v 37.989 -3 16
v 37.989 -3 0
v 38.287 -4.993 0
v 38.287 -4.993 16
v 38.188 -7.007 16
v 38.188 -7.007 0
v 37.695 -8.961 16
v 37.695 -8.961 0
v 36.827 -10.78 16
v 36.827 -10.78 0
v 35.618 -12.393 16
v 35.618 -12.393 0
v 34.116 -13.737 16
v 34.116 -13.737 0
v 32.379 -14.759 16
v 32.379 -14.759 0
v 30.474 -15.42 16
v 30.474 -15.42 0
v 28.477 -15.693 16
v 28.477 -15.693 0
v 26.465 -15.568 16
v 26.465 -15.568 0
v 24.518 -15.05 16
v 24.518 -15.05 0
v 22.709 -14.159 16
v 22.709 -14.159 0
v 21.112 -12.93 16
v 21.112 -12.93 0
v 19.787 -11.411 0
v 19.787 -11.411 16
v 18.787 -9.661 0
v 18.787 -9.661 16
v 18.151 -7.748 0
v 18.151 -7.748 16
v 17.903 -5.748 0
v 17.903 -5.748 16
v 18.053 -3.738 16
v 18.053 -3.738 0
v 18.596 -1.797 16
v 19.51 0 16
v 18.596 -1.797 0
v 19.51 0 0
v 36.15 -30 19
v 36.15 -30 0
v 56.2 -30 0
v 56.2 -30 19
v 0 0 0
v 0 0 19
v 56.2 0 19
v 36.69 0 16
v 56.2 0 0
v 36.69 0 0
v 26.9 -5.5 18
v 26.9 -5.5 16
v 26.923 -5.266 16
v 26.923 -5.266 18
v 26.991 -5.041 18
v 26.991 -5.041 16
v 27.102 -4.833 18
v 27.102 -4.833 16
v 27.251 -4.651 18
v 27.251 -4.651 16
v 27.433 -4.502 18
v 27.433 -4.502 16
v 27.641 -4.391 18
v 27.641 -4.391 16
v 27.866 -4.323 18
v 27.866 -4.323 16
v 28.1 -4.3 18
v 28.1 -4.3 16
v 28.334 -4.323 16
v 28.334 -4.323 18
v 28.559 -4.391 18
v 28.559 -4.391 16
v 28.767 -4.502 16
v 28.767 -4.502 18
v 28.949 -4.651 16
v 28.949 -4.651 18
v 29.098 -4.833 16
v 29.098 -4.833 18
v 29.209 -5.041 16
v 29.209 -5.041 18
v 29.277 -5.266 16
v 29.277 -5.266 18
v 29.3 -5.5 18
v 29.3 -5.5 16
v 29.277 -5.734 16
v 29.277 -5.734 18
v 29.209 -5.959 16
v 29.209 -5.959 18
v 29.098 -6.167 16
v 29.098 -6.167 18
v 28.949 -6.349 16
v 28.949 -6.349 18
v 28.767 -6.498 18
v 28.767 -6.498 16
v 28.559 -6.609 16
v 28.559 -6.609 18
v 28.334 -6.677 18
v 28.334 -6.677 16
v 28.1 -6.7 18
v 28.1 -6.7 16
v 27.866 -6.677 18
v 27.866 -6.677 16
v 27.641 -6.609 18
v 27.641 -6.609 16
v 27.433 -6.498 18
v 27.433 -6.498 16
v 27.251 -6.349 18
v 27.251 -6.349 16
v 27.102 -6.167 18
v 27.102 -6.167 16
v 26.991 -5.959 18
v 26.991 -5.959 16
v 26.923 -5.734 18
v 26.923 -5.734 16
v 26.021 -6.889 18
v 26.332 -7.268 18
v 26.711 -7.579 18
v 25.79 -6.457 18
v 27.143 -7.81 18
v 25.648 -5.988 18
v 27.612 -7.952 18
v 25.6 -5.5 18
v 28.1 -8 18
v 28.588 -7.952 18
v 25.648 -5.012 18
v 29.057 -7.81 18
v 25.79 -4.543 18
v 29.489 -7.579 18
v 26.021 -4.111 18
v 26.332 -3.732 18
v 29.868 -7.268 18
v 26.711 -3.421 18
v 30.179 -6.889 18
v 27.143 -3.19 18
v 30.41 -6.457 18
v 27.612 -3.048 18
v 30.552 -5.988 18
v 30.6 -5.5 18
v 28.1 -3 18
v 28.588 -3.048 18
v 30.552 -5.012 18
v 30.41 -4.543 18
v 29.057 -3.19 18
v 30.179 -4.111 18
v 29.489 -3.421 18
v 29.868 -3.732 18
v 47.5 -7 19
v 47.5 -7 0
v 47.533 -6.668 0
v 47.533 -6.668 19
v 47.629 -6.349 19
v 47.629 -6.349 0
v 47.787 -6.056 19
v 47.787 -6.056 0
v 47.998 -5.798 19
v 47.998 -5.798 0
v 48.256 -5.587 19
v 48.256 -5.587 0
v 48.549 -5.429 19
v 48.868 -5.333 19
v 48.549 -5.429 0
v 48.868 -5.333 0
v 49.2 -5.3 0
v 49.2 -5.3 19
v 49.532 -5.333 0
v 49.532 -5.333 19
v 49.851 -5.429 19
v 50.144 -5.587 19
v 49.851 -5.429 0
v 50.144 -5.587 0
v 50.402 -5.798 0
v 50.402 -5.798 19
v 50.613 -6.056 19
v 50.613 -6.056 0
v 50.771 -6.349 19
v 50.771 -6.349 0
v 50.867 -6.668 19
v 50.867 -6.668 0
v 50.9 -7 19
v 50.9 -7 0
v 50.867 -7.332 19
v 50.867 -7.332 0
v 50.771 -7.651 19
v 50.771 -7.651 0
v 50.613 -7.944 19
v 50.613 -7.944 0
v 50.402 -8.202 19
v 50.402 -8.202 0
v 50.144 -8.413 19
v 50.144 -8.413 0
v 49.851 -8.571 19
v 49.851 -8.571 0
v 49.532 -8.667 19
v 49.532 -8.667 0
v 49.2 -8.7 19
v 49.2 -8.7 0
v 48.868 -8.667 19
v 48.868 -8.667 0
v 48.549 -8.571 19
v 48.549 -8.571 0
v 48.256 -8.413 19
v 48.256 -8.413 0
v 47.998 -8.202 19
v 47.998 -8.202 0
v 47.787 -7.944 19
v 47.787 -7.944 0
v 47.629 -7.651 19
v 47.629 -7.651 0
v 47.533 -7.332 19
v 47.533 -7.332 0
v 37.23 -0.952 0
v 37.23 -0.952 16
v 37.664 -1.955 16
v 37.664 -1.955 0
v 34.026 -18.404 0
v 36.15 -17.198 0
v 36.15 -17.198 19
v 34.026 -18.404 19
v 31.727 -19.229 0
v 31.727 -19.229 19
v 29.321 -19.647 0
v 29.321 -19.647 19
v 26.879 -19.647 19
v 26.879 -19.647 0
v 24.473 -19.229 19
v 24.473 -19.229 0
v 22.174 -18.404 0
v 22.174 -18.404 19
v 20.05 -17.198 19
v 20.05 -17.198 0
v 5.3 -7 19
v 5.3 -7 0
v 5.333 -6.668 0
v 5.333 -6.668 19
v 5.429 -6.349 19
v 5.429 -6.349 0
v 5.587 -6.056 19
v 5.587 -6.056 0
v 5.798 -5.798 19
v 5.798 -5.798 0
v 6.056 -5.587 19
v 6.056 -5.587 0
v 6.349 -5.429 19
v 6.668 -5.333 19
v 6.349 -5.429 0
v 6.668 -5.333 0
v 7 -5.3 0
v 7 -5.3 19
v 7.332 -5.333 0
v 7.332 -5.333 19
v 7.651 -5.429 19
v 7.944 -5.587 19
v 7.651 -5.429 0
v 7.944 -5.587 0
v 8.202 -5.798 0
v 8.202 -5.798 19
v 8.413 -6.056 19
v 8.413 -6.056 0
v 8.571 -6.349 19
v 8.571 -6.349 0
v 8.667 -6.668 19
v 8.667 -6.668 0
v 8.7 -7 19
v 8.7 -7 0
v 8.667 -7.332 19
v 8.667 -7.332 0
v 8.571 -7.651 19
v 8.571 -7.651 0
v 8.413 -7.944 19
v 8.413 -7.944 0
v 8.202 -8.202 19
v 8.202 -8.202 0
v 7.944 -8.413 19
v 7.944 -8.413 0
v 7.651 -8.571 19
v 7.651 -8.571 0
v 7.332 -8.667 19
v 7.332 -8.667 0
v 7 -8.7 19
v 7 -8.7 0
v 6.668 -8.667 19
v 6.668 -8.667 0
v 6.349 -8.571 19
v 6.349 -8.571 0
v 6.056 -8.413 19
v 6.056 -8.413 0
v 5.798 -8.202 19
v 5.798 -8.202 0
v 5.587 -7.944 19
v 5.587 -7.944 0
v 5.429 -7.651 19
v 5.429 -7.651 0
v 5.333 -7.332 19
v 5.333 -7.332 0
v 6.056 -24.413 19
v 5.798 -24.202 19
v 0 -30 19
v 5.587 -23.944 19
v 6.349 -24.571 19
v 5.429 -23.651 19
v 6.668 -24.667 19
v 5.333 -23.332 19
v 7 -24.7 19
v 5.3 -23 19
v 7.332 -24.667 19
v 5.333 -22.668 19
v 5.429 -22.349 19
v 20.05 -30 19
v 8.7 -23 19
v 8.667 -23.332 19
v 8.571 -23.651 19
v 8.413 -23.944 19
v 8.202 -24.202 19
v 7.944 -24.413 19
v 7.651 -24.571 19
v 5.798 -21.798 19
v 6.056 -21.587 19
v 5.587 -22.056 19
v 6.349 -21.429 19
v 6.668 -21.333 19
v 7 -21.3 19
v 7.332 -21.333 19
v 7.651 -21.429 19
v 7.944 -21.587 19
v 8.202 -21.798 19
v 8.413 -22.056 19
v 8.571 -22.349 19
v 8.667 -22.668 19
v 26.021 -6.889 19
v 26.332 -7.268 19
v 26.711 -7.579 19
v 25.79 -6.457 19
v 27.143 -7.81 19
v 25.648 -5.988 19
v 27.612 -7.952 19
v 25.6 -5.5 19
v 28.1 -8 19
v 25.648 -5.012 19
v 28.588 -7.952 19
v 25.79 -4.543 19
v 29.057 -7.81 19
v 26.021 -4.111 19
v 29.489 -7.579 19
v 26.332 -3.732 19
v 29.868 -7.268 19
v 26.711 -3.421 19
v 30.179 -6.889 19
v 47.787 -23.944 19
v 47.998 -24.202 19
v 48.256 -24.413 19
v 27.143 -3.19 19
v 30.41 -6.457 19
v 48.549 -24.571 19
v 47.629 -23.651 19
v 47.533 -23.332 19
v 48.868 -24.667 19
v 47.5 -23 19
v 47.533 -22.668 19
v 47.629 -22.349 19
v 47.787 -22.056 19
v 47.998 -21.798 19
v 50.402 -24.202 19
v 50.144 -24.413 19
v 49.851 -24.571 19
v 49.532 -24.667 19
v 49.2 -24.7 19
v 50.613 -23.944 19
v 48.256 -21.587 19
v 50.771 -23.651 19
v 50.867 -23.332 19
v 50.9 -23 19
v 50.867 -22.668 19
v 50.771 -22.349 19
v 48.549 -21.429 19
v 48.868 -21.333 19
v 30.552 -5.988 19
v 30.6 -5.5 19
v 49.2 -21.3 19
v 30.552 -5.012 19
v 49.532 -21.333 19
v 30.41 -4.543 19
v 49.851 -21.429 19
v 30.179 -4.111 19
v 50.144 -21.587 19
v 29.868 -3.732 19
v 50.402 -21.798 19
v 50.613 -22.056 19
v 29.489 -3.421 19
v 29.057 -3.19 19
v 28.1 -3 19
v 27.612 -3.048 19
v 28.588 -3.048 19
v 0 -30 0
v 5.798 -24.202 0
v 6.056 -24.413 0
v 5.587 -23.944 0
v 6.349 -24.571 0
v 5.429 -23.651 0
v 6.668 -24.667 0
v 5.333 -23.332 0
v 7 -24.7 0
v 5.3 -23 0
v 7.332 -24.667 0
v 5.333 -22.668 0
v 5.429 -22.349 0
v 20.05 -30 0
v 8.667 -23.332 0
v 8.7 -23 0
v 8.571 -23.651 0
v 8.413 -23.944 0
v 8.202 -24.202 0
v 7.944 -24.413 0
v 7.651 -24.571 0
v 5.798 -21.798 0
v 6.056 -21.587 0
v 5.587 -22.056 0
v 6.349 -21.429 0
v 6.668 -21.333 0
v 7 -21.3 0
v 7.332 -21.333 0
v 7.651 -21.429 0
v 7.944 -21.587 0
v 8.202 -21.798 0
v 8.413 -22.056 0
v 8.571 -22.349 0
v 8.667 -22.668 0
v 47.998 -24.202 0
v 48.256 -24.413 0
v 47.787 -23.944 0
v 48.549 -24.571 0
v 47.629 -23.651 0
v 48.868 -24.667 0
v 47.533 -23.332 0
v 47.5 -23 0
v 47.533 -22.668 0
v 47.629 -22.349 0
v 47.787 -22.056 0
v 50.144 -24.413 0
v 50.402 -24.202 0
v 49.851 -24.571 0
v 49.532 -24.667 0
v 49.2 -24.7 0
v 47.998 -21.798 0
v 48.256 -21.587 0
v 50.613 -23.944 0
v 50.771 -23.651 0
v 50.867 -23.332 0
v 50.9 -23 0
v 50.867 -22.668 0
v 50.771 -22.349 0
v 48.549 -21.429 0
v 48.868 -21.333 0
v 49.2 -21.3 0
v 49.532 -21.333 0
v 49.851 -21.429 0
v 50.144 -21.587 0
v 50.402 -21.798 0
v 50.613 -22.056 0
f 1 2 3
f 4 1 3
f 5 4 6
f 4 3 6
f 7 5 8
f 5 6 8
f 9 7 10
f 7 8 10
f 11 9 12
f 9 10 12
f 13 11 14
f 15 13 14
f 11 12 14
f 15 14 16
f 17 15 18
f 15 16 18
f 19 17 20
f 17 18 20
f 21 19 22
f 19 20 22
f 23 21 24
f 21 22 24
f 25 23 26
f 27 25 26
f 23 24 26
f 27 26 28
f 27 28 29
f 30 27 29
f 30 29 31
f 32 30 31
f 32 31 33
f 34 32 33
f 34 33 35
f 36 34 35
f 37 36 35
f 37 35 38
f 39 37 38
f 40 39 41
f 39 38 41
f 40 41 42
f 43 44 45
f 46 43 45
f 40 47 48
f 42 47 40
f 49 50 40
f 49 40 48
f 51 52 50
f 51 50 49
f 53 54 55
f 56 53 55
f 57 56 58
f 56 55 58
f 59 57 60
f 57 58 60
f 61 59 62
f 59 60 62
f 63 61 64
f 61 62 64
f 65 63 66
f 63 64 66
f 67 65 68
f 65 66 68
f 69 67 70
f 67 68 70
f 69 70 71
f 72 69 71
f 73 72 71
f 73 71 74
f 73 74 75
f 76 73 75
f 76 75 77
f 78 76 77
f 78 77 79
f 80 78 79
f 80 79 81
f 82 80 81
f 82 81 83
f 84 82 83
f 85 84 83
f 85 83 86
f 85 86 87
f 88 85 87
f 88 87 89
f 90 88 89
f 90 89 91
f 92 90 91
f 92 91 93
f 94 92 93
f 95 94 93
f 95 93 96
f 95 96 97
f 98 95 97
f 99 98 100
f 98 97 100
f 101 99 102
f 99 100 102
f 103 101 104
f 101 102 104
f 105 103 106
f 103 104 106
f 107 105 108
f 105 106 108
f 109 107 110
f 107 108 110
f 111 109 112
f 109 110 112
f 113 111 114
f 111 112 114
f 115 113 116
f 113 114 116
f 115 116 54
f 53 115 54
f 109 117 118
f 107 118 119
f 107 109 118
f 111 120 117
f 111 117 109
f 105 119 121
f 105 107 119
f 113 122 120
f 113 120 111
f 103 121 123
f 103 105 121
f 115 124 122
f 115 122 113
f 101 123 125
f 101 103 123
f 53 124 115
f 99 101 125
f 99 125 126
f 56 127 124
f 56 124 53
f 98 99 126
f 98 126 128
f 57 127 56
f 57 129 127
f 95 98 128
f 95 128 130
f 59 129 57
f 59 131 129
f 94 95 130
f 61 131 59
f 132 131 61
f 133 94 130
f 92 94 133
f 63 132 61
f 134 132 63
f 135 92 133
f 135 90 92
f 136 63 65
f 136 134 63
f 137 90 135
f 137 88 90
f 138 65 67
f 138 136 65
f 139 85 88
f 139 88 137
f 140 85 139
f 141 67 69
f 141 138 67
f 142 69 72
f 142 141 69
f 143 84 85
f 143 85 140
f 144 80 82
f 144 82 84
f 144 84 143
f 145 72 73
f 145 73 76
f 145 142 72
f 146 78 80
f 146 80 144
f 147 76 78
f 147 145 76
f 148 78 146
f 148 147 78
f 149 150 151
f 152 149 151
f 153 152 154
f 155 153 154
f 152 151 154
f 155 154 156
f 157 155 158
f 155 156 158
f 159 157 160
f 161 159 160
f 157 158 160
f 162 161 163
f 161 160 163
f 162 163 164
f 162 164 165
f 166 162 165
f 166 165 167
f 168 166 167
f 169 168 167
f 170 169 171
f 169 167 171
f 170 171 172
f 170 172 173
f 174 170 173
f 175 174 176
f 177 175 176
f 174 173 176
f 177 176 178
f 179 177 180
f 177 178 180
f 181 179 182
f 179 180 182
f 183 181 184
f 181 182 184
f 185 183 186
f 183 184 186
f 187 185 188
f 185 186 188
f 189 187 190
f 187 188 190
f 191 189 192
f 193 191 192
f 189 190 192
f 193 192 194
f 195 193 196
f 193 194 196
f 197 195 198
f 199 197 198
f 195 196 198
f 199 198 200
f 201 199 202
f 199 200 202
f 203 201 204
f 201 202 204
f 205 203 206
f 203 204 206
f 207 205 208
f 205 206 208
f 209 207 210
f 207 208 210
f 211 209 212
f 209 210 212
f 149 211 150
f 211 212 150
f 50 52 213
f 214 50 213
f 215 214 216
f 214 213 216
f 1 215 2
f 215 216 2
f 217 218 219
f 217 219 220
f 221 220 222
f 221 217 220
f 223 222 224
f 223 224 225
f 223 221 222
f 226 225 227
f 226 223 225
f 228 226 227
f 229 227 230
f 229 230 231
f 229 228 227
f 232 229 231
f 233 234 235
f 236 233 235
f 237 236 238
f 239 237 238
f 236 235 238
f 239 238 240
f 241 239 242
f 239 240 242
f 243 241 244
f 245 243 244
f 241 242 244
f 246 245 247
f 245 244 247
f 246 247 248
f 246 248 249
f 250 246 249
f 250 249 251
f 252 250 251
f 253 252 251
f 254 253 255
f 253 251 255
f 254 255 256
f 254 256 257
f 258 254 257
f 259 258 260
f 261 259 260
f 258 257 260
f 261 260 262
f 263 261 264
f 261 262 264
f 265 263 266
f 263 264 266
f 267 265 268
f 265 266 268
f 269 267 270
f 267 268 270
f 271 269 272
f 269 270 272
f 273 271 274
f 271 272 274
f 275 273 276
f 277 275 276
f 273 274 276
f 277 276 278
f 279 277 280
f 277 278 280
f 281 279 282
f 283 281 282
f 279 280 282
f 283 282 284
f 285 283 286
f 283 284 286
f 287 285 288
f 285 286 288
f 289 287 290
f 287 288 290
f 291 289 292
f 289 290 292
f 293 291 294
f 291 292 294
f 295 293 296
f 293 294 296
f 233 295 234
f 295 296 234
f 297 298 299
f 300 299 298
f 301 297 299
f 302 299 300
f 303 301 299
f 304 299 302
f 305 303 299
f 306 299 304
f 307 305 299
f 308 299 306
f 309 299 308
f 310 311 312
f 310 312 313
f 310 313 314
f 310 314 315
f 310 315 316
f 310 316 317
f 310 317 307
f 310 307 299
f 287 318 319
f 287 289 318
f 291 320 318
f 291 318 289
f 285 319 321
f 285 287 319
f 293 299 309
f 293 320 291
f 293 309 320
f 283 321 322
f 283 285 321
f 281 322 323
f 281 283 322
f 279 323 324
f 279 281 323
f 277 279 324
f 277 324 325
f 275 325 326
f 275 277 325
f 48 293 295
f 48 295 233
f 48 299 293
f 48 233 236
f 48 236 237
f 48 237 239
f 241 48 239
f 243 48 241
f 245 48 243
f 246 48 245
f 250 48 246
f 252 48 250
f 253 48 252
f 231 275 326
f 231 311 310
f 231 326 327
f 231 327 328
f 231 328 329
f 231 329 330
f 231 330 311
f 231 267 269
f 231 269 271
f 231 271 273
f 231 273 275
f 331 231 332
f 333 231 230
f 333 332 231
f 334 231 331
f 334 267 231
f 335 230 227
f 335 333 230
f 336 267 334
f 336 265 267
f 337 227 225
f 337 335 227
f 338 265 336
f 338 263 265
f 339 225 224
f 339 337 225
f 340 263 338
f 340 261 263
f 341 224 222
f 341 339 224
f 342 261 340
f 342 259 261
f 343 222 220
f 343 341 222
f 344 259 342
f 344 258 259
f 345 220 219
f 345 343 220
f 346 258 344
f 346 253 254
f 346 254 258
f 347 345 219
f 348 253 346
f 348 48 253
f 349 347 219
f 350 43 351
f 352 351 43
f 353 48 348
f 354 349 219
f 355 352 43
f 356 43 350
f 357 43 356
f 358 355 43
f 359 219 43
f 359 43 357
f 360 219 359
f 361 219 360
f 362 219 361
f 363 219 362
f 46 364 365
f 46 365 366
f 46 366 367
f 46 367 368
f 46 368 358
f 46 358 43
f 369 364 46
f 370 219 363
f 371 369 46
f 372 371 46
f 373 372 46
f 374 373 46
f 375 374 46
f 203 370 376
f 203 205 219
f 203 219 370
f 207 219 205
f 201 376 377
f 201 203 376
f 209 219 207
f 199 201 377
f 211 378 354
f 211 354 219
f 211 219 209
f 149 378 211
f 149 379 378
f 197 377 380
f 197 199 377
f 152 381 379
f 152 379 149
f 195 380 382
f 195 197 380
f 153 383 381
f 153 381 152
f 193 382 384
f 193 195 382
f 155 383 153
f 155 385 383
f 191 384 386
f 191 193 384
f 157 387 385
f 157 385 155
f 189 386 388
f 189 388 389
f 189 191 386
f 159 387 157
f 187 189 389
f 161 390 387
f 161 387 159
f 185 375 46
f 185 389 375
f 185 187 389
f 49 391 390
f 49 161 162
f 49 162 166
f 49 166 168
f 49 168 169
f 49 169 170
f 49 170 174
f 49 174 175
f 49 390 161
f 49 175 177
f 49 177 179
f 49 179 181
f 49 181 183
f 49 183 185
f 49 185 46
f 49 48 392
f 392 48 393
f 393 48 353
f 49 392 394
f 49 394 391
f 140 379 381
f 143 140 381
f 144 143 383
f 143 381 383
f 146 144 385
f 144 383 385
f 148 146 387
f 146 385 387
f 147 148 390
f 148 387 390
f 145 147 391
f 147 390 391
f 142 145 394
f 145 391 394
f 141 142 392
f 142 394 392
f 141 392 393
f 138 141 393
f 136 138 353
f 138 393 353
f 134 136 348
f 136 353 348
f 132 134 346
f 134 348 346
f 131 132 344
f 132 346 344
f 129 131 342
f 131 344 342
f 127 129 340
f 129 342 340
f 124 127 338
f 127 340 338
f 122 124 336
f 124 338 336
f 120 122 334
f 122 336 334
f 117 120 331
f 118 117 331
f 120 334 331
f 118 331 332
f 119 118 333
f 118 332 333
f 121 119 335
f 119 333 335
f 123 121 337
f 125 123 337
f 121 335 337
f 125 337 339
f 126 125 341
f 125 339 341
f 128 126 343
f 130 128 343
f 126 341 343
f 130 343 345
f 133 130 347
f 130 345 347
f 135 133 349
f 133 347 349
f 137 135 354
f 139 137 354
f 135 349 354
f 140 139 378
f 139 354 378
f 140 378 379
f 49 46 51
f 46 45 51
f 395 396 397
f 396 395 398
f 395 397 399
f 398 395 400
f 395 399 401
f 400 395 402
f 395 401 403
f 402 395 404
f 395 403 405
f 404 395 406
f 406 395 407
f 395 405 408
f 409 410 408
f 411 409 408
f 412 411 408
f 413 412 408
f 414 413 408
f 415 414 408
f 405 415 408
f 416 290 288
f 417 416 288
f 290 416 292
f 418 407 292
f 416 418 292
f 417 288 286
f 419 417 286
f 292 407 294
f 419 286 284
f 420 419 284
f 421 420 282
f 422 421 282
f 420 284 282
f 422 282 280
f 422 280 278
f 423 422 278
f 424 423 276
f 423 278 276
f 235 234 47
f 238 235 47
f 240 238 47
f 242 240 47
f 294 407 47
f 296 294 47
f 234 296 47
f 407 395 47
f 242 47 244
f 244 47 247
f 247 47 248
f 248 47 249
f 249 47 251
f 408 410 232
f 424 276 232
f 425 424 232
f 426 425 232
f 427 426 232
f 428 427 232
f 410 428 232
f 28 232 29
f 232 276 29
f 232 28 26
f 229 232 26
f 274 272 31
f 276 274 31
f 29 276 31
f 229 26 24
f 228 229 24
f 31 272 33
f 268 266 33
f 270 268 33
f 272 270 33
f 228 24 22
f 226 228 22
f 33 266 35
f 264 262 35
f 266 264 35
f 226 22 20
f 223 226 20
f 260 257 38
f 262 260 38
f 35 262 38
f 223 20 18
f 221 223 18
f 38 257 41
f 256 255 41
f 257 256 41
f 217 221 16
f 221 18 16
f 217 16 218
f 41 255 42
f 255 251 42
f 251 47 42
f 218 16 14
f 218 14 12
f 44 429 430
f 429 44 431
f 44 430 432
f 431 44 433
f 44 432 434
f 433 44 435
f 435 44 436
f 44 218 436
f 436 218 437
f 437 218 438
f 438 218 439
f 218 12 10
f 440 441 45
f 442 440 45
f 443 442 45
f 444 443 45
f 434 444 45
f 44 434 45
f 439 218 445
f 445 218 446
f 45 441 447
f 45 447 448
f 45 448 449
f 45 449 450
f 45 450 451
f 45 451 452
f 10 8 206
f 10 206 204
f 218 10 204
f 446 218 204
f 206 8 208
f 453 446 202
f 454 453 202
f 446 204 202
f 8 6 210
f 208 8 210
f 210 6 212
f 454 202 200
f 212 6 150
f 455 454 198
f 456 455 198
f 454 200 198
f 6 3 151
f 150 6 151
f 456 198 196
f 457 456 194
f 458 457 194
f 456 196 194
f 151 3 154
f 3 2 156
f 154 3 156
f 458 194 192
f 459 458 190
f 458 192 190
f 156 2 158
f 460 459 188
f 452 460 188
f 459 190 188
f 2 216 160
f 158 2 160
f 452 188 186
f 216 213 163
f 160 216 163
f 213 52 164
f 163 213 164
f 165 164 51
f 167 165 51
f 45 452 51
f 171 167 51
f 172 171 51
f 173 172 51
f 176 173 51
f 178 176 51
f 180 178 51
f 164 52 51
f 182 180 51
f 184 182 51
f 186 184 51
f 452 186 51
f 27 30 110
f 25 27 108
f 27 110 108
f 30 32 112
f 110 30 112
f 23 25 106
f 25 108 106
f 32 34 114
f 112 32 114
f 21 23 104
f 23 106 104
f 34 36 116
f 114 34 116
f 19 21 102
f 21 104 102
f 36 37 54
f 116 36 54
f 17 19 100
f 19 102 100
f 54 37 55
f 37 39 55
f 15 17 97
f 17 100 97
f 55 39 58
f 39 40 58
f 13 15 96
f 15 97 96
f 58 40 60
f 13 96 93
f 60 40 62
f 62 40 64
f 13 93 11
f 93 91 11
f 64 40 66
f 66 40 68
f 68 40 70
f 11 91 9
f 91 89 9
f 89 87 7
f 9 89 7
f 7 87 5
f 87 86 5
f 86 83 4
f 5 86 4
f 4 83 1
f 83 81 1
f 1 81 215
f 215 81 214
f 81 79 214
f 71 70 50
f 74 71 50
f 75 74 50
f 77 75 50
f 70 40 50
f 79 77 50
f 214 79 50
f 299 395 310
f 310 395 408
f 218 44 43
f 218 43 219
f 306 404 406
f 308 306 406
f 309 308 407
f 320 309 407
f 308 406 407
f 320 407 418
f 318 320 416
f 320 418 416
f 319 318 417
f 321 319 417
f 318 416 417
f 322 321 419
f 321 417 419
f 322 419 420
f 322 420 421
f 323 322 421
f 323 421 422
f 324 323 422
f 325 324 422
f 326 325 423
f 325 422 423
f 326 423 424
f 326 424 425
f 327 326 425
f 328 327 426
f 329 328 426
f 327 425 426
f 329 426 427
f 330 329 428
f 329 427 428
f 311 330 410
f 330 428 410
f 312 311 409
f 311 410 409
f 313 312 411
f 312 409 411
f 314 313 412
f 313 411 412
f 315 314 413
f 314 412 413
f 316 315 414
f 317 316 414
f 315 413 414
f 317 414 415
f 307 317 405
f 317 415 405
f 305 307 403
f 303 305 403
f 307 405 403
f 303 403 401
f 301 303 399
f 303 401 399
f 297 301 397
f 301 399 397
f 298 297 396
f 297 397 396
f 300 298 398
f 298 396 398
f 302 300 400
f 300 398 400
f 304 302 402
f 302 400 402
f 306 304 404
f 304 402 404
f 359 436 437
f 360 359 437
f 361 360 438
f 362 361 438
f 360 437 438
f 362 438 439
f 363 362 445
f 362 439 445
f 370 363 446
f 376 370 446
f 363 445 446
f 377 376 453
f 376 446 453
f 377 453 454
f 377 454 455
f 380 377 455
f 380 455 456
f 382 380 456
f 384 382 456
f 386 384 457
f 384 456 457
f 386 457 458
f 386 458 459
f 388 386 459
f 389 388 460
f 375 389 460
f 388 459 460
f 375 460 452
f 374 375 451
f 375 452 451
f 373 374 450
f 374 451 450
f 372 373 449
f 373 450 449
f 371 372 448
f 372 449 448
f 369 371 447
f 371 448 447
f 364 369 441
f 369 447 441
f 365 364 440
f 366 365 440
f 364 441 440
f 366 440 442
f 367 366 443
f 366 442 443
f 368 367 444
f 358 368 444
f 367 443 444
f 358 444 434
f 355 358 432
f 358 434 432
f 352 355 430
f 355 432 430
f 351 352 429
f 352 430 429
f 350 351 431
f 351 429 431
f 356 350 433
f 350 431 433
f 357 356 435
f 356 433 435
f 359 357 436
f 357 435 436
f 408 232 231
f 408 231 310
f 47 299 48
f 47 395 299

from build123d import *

# Parameters (mm, degrees)
BOSS_EXTRUDE1_DEPTH = 16
SKETCH3_W           = 56.2
SKETCH3_H           = 30
BOSS_EXTRUDE2_DEPTH = 3
SKETCH4_R           = 1.7
SKETCH4_R_2         = 1.2
CUT_EXTRUDE2_DEPTH  = 19
CUT_EXTRUDE3_DEPTH  = 16
CUT_EXTRUDE6_REACH  = 21
SKETCH10_R          = 2.5
CUT_EXTRUDE7_DEPTH  = 1


with BuildPart() as part:
    # Sketch1 → Boss-Extrude1 (new body)
    with BuildSketch(Plane.XY):
        with BuildLine():
            Line((19.509889407, 0), (0, 0))
            Line((0, 0), (0, -30))
            Line((0, -30), (56.2, -30))
            Line((56.2, -30), (56.2, 0))
            Line((56.2, 0), (36.690110593, 0))
            Line((36.690110593, 0), (35.825930365, 0))
            ThreePointArc((35.825930365, 0), (34.325930365, -1.5), (35.825930365, -3))
            Line((35.825930365, -3), (37.988882647, -3))
            ThreePointArc((37.988882647, -3), (26.465465751, -15.568182447), (19.509889407, 0))
        make_face()
    extrude(amount=BOSS_EXTRUDE1_DEPTH)

    # Sketch3 → Boss-Extrude2 (add)
    with BuildSketch(Plane.XY.offset(16)):
        with Locations((28.1, -15)):
            Rectangle(SKETCH3_W, SKETCH3_H)
    extrude(amount=BOSS_EXTRUDE2_DEPTH)

    # Sketch4 → Cut-Extrude2 (cut)
    with BuildSketch(Plane(origin=(0, 0, 0), x_dir=(-1, 0, 0), z_dir=(0, 0, -1))):
        with Locations((-49.2, -7)):
            Circle(SKETCH4_R)
        with Locations((-7, -7)):
            Circle(SKETCH4_R)
        with Locations((-7, -23)):
            Circle(SKETCH4_R)
        with Locations((-49.2, -23)):
            Circle(SKETCH4_R)
        with Locations((-28.1, -5.5)):
            Circle(SKETCH4_R_2)
    extrude(amount=-CUT_EXTRUDE2_DEPTH, mode=Mode.SUBTRACT)

    # Sketch5 → Cut-Extrude3 (cut)
    with BuildSketch(Plane(origin=(0, 0, 0), x_dir=(-1, 0, 0), z_dir=(0, 0, -1))):
        with BuildLine():
            Line((-19.509889407, 0), (-36.690110593, 0))
            ThreePointArc((-36.690110593, 0), (-28.1, -15.7), (-19.509889407, 0))
        make_face()
    extrude(amount=-CUT_EXTRUDE3_DEPTH, mode=Mode.SUBTRACT)

    # Sketch9 → Cut-Extrude6 (cut, up to next)
    with BuildSketch(Plane.XY, mode=Mode.PRIVATE) as cut_extrude6_sk1:
        with BuildLine():
            Line((36.15, -30), (36.15, -17.197756195))
            ThreePointArc((36.15, -17.197756195), (28.1, -19.7), (20.05, -17.197756195))
            Line((20.05, -17.197756195), (20.05, -30))
            Line((20.05, -30), (36.15, -30))
        make_face()
    cut_extrude6_tool1 = extrude(cut_extrude6_sk1.sketch, amount=CUT_EXTRUDE6_REACH, mode=Mode.PRIVATE) & part.part
    add(cut_extrude6_tool1.solids().sort_by_distance((28.1, -24.424534, 0))[0], mode=Mode.SUBTRACT)

    # Sketch10 → Cut-Extrude7 (cut)
    with BuildSketch(Plane.XY.offset(19)):
        with Locations((28.1, -5.5)):
            Circle(SKETCH10_R)
    extrude(amount=-CUT_EXTRUDE7_DEPTH, mode=Mode.SUBTRACT)


solid = part.part
